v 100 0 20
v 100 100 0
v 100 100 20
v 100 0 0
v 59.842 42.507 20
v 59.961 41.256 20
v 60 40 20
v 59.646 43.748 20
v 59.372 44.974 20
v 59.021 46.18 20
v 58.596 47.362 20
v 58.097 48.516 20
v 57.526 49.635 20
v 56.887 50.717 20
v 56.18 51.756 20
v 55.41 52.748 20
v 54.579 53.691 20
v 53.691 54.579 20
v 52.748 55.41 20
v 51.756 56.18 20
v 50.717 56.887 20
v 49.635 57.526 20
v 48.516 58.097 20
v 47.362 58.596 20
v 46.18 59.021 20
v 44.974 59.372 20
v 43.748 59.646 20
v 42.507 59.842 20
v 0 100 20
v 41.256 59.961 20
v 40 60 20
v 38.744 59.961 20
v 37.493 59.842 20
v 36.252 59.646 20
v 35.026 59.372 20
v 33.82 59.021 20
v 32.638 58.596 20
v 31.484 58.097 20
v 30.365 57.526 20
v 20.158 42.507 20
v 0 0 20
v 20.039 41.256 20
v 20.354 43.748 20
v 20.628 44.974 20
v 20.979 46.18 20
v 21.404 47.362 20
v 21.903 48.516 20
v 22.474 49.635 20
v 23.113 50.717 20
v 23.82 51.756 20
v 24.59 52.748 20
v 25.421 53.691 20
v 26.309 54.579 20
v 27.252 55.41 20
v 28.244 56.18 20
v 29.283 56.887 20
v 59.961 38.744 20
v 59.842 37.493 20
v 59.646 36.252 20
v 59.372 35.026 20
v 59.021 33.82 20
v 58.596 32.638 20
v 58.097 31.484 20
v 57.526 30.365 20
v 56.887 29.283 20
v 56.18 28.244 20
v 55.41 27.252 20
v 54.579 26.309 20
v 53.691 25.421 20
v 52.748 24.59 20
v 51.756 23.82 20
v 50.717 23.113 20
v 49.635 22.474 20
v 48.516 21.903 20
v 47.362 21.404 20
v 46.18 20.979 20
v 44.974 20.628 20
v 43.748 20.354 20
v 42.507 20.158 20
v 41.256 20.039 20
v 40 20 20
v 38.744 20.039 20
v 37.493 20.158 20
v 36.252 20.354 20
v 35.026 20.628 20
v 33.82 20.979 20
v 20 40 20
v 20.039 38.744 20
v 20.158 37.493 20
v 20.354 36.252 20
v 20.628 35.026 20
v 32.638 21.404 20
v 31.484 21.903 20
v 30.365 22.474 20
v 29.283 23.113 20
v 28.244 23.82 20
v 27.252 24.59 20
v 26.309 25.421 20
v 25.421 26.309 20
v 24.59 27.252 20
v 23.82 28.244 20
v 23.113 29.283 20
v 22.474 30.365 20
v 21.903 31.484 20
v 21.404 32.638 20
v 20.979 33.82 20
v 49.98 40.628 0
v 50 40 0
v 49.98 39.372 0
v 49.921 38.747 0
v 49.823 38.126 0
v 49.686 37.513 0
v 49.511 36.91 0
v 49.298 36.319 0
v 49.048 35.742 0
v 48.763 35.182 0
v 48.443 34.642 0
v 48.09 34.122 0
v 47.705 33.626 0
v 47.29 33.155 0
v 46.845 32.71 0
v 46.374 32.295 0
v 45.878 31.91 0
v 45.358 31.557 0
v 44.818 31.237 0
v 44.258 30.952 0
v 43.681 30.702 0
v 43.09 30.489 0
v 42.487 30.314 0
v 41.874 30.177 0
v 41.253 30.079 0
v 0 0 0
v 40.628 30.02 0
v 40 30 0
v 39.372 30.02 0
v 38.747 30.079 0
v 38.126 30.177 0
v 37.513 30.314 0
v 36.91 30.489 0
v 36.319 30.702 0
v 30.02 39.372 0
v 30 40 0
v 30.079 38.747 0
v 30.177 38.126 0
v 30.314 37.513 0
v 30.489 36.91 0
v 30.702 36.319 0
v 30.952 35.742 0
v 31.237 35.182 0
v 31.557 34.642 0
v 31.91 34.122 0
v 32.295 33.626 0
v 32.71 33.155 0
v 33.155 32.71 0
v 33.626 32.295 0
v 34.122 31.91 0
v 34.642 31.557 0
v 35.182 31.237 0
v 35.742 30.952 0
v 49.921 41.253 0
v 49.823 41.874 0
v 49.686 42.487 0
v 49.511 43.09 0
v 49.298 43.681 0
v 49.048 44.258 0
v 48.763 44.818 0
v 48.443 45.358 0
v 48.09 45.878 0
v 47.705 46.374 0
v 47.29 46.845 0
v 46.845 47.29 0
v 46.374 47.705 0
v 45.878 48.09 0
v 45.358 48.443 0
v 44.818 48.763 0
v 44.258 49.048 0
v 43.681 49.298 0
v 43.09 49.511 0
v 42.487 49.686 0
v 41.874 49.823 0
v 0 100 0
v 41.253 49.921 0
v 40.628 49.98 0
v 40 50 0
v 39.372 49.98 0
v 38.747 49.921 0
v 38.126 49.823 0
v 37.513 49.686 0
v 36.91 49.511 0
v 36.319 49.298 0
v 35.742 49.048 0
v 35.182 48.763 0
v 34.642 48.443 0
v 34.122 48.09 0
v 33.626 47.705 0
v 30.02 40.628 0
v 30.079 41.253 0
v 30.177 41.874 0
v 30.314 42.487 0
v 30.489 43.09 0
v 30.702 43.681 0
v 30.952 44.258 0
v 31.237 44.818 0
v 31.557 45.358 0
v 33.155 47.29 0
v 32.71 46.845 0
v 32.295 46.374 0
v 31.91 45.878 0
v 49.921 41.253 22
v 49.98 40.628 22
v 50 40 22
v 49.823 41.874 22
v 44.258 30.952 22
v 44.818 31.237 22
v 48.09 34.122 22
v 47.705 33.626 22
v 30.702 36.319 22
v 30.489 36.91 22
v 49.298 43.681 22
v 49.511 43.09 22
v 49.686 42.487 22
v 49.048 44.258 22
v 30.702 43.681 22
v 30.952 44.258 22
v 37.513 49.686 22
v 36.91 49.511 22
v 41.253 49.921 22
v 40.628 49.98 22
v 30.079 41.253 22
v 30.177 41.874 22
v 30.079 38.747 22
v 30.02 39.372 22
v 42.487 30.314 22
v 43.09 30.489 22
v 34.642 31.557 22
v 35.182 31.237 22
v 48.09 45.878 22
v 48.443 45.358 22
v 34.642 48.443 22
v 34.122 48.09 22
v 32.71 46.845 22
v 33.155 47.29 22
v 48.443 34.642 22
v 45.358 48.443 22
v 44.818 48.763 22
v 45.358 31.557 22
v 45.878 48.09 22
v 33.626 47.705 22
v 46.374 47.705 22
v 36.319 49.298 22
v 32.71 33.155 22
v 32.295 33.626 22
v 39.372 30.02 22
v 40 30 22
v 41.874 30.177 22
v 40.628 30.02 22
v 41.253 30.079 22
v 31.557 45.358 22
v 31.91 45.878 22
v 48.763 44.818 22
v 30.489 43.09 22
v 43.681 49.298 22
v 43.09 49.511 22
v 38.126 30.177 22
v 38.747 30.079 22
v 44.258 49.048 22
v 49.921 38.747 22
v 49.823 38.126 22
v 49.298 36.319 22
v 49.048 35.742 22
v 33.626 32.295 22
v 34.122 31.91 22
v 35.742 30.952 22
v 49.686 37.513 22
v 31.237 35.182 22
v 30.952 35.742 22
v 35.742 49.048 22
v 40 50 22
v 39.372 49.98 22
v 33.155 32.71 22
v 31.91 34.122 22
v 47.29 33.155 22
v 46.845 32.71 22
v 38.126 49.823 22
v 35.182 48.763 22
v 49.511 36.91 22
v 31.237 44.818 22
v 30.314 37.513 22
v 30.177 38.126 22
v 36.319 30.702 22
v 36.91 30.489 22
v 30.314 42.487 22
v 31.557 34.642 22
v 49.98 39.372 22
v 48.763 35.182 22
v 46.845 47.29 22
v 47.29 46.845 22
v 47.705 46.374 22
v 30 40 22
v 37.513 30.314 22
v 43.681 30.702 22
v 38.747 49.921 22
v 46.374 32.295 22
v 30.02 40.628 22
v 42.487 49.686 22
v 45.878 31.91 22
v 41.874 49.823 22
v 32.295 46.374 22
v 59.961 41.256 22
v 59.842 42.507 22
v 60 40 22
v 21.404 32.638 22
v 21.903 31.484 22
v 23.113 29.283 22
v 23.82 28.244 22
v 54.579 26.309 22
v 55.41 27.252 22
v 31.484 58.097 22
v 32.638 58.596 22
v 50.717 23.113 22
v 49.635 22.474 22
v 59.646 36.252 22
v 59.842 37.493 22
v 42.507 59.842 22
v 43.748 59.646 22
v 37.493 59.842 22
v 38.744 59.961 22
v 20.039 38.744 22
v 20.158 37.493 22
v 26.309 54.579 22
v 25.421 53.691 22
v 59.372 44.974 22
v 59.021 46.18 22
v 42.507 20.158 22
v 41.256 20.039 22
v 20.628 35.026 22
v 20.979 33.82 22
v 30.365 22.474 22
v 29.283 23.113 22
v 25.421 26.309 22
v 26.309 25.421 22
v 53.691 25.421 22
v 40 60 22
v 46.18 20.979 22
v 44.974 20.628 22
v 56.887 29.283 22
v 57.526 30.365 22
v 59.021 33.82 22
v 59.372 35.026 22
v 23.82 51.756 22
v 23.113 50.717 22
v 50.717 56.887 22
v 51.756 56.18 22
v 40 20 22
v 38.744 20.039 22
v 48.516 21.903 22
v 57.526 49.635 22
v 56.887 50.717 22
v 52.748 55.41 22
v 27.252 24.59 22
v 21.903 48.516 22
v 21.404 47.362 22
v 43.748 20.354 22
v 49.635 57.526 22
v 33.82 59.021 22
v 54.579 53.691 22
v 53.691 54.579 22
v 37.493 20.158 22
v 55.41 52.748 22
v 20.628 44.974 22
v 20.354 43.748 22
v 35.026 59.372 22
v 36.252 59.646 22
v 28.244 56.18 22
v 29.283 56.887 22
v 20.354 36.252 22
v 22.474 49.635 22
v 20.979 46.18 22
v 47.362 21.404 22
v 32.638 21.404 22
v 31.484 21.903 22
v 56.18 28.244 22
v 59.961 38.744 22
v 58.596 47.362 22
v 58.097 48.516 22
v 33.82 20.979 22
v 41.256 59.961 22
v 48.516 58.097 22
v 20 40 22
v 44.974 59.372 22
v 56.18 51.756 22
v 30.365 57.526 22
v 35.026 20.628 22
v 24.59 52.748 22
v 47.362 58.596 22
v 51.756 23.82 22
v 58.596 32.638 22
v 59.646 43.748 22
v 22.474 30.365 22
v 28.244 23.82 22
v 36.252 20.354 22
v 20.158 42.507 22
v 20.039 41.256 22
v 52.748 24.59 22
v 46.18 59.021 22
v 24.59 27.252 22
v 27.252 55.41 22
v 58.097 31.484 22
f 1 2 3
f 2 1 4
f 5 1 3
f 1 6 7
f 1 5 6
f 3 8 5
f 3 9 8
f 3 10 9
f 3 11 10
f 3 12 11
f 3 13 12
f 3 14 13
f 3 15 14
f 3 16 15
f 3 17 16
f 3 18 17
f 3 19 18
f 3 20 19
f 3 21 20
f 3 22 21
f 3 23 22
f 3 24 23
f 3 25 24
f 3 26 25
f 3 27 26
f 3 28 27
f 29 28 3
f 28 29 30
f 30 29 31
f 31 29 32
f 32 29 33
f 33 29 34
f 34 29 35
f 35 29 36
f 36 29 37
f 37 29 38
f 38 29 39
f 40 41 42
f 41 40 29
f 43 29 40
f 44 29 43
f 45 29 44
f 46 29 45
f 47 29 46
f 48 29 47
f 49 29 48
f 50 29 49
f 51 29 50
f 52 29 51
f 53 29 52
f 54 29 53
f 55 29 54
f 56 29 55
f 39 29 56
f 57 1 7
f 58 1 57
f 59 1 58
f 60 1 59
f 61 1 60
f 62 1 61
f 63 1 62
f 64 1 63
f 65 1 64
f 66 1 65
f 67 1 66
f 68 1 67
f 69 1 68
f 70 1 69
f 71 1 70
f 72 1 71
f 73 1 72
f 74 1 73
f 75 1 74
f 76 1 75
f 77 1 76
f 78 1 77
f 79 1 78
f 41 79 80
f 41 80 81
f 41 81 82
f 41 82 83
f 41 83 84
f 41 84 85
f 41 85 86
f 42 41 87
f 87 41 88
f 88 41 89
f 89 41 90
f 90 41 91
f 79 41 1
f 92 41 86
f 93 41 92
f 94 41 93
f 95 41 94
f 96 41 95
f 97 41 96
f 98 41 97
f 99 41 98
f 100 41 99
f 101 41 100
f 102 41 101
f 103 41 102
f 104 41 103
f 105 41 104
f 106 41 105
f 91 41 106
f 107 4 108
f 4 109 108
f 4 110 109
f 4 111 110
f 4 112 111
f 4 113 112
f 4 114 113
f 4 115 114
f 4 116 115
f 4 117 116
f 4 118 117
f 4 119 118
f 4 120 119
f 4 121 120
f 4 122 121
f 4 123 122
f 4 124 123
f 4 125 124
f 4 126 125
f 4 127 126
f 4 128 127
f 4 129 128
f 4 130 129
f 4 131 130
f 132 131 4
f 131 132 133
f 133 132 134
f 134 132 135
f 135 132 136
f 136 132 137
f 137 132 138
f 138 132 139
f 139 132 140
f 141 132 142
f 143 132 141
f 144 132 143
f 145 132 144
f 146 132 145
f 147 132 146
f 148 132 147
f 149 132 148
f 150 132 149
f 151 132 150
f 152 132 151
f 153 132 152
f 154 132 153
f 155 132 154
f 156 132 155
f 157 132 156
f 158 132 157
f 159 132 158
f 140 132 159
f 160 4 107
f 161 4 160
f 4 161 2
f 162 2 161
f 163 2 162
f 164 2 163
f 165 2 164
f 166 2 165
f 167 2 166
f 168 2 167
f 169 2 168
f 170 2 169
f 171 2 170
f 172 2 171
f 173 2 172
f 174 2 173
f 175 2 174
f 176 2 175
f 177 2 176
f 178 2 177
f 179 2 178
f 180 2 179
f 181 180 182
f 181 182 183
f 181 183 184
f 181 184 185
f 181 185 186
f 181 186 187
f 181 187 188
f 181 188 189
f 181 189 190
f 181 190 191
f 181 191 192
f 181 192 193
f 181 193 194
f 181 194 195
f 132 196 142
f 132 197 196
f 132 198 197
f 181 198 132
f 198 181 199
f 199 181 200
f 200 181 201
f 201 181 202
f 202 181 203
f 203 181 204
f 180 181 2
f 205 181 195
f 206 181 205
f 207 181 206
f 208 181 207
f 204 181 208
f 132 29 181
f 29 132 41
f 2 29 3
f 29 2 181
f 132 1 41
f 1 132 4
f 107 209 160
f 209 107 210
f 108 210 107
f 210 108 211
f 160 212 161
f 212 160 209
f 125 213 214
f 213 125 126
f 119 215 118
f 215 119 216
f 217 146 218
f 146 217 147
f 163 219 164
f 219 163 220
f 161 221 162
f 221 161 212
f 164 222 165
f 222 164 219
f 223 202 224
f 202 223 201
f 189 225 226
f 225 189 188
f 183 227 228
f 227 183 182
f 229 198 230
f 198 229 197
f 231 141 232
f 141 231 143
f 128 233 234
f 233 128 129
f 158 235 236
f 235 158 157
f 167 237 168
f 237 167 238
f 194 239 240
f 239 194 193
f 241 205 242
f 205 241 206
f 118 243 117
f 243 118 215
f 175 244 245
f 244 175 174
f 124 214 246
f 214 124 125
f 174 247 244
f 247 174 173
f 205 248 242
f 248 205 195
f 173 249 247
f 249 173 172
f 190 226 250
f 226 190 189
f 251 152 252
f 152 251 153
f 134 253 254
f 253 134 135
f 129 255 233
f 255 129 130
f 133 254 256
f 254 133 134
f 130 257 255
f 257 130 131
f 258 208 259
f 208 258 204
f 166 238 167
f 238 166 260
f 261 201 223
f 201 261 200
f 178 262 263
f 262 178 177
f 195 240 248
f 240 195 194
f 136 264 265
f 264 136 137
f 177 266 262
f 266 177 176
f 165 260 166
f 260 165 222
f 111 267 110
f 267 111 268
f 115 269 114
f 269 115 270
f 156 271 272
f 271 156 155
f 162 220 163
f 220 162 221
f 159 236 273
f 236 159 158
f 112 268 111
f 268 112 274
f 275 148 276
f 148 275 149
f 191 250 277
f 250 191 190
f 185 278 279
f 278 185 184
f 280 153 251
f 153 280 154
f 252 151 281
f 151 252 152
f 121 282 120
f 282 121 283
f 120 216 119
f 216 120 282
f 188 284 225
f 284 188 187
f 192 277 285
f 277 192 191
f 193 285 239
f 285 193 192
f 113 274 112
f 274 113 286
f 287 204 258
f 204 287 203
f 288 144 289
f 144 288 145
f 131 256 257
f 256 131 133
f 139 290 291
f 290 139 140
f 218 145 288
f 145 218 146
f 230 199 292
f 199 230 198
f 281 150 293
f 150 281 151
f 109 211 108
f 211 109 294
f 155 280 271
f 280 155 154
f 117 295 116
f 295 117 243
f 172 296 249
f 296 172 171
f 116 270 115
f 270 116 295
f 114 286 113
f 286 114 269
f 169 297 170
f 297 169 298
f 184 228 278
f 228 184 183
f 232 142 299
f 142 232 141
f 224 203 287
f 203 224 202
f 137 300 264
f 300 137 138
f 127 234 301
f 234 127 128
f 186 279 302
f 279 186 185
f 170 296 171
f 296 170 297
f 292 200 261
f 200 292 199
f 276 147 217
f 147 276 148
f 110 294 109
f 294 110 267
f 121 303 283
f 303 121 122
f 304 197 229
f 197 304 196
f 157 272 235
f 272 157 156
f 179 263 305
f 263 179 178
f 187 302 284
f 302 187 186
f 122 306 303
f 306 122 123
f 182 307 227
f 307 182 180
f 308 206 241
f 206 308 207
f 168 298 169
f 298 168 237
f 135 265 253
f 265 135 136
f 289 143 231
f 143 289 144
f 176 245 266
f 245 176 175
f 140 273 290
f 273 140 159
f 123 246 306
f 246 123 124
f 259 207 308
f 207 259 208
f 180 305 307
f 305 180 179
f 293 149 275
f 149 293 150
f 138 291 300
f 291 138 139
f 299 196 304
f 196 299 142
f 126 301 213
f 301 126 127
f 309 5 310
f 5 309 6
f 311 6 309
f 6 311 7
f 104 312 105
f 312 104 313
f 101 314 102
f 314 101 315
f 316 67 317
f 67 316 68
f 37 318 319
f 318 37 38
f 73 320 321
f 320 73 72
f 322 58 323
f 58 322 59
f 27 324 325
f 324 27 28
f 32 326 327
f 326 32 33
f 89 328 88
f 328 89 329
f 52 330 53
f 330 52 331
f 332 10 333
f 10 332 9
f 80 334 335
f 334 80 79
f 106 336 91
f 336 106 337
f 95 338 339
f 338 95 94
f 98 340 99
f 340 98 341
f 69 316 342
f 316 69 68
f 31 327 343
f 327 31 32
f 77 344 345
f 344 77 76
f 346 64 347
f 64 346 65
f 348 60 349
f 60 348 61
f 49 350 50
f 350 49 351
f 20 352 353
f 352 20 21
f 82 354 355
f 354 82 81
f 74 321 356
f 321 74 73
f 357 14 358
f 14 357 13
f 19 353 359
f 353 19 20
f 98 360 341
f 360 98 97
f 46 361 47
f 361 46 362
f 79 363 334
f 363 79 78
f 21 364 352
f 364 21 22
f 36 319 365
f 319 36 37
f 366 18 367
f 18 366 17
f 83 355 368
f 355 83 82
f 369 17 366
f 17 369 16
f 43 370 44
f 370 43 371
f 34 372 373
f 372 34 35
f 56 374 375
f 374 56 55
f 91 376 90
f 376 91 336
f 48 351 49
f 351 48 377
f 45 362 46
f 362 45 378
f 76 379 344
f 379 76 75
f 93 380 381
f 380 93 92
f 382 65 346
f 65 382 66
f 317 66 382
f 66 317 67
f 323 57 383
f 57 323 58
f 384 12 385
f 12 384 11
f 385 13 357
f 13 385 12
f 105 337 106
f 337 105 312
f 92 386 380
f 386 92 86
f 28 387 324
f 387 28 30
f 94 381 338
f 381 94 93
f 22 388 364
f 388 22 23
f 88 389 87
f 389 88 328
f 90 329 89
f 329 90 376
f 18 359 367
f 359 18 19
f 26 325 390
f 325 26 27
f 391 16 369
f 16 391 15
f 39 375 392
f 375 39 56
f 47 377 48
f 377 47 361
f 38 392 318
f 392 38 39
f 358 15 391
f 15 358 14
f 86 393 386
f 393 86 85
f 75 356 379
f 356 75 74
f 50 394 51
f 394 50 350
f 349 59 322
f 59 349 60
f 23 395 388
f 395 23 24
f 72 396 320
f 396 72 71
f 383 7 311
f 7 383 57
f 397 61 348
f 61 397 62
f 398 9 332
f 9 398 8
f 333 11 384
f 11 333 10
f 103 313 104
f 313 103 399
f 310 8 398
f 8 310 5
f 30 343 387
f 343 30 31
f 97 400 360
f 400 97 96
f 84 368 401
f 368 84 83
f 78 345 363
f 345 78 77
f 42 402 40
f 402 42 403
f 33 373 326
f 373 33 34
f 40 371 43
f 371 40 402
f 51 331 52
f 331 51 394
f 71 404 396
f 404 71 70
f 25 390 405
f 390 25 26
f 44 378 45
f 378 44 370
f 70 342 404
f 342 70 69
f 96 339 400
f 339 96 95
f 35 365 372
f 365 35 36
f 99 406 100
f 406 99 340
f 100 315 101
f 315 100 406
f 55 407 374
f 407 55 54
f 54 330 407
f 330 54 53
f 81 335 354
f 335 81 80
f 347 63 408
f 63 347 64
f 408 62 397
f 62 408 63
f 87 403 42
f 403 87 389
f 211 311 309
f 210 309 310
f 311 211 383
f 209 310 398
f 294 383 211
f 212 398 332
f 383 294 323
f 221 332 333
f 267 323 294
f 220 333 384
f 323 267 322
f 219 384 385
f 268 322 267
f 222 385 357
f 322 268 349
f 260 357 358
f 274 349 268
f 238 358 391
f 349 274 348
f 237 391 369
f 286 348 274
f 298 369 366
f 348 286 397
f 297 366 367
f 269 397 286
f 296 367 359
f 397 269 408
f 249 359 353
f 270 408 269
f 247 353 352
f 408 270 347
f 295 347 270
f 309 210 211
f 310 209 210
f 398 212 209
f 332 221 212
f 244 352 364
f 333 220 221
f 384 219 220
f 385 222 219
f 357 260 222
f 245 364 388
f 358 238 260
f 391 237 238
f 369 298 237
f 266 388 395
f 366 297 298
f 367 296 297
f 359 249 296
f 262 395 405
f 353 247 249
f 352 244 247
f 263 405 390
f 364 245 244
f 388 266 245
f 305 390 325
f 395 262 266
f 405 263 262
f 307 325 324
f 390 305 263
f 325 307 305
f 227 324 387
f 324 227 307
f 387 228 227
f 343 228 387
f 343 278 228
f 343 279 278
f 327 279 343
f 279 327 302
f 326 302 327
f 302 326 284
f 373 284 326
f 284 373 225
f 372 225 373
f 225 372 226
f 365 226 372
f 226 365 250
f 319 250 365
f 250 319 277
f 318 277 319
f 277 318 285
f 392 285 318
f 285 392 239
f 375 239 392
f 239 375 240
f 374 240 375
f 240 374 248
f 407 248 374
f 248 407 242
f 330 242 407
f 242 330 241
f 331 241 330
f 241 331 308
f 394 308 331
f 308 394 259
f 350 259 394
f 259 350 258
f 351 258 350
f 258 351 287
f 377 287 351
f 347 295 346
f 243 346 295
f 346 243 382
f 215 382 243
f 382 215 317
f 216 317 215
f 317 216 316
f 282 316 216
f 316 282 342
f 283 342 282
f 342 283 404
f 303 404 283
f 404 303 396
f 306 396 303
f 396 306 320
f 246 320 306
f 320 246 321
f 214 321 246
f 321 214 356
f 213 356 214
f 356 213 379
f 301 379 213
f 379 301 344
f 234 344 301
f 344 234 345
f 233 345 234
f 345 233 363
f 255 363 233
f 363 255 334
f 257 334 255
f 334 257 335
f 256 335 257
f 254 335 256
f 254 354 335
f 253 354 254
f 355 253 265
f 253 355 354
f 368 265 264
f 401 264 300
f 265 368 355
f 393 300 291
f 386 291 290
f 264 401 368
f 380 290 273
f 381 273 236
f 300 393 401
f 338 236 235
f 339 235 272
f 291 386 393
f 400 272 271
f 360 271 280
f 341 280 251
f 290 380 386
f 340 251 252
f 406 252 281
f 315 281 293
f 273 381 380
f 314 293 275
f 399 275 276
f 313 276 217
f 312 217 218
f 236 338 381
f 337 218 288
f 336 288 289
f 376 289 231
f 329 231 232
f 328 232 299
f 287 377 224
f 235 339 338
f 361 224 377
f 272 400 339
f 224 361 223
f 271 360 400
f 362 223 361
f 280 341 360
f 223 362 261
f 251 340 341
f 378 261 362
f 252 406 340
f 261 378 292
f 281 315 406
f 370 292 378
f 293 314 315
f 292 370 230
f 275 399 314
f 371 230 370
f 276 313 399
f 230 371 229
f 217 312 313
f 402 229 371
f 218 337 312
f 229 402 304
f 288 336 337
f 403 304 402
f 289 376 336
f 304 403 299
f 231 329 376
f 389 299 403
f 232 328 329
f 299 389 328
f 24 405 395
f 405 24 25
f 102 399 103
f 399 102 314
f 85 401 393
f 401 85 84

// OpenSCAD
/* 
    Test für Cura mit unterschiedlichen Füllungen. Major Pain.
    
    Gebaut werden soll eine Platte mit Bohrung. Der Bereich mit der Bohrung
    soll eine dichtere Füllung erhalten.
    
    In Openscad
    
    Schritt 1:  ganz normal das Objekt bauen
    Schritt 2:  die Bereiche für ein anderes Infill mit überlapppenden Objekten füllen
                    Dabei so den Quelltext gestalten, dass die das normale Objekt und die
                    Überlappungsbereiche getrennt sind.
    Schritt 3:  Objekt als 3MF exportieren
    Schritt 4:  Überlappung als 3MF exportieren
    
    In Cura
    
    Schritt 1:  Beide 3MFs zum Druckbereich hinzufügen
                    Das sieht möglicherweise völlig falsch und unbrauchbar aus. Ruhig bleiben,
                    alles ist gut.
    Schritt 2:  Objekkt mit den besonderen Einstellungen auswählen, dann:
                    links: Einstellungen per Objekt, Einstellungen wählen, nach Fülldichte suchen
                    und ankreuzen und im nun auftauchenden Fülldichte-Feld die gewünschte
                    Fülldichte einstellen.
    Schritt 3:  beide Objekte auswählen und im Kontextmenü "Modelle gruppieren" auswählen.
                    Die beiden Objekte sollten jetzt positionsrichtig verschmelzen.
                    Es sieht möglicherweise wieder voll falsch und unbrauchbar aus. Einfach
                    in Ruhe das zusammengefügte Objekt mit der linken Seitenleiste auf der 
                    Druckfläche positionieren.
                    
Das alles ist Major Pain, wenn man am Model entwickelt. Daher noch ein Überlebenstipp:
Die Druckgeschichten einfach via Batch erzeugen: in eine "doit.cmd" hineintun:
  
"openscad.exe" -o "teil1.3mf" -D "mode=1" "teil.scad"
"openscad.exe" -o "teil2.3mf" -D "mode=2" "teil.scad"

und aufrufen, wenn man mit dem Design fertig ist.

Wenn man das Objekt in Cura geöffnet hält, läd Cura bei Änderungen auch korrekt die
Teile neu.
*/

$fn = $preview ? 10 : 100;   // hier ändern für schnelleres Rendern

// Laufzeitmodus, mode kann von Kommandozeile kommen
mode = is_undef(mode) ? 0 : mode; 
// 0: in IDE, 1: nur Basisobjekt, 2: Füllobjekt

if (mode==0) {
    // Hier kann man je nach Lust und Laune das Entwickeln machen.
    platte();
    fuellung();
}

if (mode==1) {
    platte();
}

if (mode==2) {
    fuellung();
}

module platte() {
    // Das ist das Basisobjekt: Platte mit Bohrung
    difference() {
        cube([100,100,20]);
        
        translate([40,40,-10])
        cylinder(r=10,h=30);
    }
}    

module fuellung() {
    // Das ist der dichtere Infillbereich (Höhenunterschied nur zur Visualisierung)
    difference() {
        translate([40,40,0])
        cylinder(r=20,h=22);
        
        translate([40,40,-10])
        cylinder(r=10,h=40);
    }
}
